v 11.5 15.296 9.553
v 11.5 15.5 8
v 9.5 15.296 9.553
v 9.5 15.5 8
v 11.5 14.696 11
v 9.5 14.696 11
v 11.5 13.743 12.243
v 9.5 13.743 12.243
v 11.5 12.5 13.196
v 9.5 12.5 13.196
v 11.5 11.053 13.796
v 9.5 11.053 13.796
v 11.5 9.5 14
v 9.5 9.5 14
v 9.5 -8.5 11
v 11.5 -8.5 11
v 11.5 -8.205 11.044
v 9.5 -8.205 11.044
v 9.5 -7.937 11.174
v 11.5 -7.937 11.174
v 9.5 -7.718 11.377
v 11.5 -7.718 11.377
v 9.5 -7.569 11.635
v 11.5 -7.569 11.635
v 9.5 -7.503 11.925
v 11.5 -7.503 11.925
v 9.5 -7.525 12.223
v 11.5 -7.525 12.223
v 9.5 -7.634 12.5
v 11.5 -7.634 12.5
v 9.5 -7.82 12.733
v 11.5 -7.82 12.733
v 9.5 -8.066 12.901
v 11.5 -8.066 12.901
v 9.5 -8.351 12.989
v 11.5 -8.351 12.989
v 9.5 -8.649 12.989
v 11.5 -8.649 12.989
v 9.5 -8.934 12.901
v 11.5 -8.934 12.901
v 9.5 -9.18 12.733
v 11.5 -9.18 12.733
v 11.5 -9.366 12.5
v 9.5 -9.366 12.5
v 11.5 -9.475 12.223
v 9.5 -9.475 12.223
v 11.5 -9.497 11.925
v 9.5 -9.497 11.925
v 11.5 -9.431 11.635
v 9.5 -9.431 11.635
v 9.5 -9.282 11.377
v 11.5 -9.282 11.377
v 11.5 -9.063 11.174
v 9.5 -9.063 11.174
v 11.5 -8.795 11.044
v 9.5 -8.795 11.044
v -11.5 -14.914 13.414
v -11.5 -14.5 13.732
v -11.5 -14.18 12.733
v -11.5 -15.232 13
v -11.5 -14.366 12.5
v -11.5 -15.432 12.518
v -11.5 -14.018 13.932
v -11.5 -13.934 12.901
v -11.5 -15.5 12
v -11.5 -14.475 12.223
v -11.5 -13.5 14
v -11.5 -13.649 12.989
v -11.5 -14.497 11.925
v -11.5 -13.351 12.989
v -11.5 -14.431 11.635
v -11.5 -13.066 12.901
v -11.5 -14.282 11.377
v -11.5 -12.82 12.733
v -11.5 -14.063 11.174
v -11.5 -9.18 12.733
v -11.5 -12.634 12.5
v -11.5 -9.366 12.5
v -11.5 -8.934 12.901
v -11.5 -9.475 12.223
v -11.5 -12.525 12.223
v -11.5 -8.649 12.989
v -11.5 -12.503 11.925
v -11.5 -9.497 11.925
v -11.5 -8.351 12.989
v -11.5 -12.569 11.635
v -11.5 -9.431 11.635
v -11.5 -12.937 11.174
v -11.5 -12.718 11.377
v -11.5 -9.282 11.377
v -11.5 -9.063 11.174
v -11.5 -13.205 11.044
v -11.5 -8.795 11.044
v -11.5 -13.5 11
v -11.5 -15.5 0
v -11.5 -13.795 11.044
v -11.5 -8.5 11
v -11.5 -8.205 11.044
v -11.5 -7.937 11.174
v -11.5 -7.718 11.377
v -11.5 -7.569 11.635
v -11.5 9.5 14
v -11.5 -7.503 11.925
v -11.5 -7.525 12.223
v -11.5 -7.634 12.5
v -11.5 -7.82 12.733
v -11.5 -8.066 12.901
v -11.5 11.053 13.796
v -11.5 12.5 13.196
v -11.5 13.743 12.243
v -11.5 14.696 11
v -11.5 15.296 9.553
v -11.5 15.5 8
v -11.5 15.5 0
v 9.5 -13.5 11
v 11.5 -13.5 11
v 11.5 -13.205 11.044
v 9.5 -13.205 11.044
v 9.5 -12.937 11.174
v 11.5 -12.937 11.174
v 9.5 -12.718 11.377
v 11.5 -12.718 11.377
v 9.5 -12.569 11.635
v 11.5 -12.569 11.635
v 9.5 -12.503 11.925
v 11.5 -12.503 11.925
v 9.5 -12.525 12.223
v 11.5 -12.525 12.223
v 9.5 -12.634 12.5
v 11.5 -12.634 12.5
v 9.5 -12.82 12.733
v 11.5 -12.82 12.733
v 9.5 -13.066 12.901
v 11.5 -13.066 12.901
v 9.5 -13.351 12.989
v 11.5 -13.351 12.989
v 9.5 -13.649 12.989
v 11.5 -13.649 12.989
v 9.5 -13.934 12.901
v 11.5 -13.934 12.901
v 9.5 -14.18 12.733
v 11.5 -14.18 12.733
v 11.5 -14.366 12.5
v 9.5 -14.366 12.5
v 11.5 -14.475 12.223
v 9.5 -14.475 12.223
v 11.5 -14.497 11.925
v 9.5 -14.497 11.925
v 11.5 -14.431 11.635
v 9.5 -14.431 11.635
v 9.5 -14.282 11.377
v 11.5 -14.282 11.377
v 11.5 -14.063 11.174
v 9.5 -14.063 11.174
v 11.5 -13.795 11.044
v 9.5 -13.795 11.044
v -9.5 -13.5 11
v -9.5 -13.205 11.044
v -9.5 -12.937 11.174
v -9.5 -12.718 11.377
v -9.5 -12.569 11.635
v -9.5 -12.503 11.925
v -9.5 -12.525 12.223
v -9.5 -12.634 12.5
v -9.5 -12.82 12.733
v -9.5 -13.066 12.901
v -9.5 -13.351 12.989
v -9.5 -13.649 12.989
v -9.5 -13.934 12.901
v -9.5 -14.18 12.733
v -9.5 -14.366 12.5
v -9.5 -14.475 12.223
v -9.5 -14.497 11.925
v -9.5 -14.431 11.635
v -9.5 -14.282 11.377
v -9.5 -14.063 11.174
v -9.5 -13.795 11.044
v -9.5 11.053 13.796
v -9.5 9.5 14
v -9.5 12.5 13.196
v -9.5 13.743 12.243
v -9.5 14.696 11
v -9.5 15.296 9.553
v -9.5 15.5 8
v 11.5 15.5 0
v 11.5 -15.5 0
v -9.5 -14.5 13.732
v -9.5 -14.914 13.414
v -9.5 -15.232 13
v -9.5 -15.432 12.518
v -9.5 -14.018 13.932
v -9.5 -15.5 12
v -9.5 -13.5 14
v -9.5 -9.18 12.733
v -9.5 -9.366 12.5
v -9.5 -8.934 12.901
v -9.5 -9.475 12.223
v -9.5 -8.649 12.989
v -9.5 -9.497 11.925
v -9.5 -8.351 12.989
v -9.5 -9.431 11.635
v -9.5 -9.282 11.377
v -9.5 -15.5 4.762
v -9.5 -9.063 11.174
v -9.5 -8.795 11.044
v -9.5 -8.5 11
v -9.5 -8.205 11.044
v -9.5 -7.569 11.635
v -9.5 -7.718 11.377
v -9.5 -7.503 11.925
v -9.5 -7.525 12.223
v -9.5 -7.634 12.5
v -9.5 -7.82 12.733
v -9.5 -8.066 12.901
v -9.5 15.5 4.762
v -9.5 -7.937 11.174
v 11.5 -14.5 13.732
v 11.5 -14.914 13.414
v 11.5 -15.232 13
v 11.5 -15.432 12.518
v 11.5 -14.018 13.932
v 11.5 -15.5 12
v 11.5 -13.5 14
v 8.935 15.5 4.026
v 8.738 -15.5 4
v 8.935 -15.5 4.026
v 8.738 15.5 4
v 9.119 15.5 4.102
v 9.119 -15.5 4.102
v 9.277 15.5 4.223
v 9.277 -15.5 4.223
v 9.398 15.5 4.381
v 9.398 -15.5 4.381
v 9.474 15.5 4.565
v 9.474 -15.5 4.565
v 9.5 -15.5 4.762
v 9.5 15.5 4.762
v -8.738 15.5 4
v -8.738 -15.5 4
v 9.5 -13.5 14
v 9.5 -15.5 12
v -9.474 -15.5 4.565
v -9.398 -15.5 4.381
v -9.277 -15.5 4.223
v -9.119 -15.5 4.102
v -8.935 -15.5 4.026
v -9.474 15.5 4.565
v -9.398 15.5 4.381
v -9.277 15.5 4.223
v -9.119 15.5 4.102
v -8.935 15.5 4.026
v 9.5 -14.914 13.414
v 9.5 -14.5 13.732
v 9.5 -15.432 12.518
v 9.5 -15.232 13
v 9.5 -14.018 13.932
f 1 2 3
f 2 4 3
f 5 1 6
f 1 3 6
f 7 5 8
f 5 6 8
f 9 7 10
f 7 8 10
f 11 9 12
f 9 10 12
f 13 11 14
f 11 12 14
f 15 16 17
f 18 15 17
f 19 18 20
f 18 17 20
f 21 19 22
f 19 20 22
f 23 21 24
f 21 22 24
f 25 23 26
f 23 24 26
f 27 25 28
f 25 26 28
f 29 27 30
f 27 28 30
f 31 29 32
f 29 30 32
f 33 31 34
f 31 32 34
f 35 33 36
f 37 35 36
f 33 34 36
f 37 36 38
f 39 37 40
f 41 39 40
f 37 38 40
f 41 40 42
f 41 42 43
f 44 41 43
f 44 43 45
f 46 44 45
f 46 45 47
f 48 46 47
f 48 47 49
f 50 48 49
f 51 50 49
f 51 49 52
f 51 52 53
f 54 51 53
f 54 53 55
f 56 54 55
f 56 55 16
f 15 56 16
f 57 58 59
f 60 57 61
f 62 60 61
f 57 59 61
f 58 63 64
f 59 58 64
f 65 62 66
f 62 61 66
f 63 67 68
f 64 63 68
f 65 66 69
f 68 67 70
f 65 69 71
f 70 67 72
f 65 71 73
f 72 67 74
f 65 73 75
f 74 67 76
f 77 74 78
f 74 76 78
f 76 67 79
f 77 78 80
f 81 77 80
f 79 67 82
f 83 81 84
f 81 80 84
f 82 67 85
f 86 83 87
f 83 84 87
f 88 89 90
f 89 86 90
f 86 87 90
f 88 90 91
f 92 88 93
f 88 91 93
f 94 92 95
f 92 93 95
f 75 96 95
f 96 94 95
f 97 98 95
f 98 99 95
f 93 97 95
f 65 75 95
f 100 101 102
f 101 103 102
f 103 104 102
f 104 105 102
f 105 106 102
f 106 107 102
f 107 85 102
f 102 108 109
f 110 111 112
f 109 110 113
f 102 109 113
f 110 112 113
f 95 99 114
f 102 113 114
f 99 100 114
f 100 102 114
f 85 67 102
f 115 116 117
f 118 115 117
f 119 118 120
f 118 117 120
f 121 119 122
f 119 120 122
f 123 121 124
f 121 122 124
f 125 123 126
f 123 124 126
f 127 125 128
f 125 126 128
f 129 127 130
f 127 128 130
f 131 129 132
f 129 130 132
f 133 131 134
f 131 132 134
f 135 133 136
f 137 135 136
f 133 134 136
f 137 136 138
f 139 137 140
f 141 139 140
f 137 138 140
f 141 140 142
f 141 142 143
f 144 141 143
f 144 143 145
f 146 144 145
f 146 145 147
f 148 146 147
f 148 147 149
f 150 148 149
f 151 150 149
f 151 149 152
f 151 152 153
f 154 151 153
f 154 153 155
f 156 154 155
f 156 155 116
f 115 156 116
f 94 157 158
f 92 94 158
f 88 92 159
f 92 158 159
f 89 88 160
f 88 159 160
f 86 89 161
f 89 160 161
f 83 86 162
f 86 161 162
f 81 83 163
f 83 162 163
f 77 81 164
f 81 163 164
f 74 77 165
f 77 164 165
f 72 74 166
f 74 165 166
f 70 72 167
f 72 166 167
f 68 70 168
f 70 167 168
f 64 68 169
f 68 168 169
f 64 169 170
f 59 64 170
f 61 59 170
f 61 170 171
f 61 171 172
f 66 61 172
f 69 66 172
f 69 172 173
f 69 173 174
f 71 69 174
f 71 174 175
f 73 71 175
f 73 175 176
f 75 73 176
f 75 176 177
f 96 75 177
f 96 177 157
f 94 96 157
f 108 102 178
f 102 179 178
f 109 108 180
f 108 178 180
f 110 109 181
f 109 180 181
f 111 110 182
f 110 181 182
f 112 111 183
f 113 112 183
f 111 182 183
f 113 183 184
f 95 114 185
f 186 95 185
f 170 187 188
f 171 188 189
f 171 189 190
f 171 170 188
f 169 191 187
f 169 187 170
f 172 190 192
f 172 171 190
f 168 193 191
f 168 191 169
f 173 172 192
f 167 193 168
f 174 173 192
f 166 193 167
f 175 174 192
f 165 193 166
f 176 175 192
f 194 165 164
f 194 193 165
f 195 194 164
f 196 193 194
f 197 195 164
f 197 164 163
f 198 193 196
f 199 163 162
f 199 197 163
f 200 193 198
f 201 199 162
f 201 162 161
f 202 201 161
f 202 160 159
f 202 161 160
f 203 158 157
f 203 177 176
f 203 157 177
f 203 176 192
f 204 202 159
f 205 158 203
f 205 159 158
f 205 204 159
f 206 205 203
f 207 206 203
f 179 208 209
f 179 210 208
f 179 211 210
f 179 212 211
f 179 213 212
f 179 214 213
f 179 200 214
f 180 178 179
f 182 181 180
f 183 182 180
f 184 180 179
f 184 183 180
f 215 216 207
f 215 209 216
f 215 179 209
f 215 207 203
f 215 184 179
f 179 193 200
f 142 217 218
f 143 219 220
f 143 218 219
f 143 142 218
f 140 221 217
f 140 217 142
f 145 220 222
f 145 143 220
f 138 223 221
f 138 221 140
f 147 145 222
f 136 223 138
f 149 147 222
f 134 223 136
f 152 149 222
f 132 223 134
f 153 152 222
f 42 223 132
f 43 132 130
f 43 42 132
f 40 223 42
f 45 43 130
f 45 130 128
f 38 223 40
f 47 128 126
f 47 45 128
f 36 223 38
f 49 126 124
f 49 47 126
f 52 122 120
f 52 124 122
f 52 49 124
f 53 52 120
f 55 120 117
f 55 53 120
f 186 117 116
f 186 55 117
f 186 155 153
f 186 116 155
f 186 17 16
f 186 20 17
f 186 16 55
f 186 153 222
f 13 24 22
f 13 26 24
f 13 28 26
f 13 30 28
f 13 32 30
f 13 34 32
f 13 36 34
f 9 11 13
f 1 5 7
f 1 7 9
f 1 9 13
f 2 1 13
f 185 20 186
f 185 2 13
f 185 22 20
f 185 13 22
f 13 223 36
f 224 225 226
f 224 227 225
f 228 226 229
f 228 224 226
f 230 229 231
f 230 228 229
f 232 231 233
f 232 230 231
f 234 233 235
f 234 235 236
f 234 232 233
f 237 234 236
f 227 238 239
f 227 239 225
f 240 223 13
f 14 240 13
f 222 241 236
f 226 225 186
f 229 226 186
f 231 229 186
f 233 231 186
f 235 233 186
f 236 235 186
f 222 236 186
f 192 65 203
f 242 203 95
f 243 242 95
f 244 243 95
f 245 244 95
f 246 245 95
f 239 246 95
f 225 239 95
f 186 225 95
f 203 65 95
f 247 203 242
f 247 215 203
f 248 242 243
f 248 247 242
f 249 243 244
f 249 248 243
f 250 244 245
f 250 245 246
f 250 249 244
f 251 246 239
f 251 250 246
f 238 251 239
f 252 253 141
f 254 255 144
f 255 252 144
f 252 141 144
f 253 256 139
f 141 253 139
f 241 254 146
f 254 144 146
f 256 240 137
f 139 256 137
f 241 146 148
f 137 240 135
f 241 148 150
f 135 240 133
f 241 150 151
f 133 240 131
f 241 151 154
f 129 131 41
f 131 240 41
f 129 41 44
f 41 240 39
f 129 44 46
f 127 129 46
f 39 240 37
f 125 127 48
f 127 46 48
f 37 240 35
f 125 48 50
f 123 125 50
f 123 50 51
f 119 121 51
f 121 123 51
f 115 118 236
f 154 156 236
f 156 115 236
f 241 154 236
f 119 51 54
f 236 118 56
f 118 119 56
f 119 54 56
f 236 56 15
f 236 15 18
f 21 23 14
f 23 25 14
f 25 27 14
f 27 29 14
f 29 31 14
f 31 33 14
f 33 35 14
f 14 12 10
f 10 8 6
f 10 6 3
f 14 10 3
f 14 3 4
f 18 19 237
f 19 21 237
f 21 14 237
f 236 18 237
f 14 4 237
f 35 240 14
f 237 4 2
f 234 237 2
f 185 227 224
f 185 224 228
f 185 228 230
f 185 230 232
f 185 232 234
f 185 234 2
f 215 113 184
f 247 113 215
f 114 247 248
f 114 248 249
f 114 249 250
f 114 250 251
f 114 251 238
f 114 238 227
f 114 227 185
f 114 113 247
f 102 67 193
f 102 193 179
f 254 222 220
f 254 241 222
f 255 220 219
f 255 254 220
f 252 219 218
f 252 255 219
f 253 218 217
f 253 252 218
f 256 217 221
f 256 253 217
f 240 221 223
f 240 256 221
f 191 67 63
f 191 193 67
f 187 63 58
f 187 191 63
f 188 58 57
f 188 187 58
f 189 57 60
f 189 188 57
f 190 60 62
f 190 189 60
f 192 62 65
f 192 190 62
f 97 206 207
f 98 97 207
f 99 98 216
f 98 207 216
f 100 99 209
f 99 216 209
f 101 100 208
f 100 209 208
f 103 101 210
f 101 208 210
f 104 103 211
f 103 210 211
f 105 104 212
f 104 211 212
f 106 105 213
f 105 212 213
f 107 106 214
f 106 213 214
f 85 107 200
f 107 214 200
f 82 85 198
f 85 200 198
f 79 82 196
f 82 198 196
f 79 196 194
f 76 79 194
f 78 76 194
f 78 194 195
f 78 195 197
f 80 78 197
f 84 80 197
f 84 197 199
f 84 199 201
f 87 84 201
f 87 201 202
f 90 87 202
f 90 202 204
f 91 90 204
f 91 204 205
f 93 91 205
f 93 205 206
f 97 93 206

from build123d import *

# Parameters (mm, degrees)
SKETCH1_W           = 23
SKETCH1_H           = 31
BOSS_EXTRUDE1_DEPTH = 4
SKETCH2_W           = 10
SKETCH2_H           = 31
BOSS_EXTRUDE2_DEPTH = 2
SKETCH3_R           = 1
CUT_EXTRUDE1_DEPTH  = 24
FILLET1_R           = 2
FILLET2_R           = 6
FILLET3_R           = 0.762


with BuildPart() as part:
    # Sketch1 → Boss-Extrude1 (new body)
    with BuildSketch(Plane.XY):
        Rectangle(SKETCH1_W, SKETCH1_H)
    extrude(amount=BOSS_EXTRUDE1_DEPTH)

    # Sketch2 → Boss-Extrude2 (add)
    with BuildSketch(Plane(origin=(11.5, 0, 0), x_dir=(0, 0, -1), z_dir=(1, 0, 0))):
        with Locations((-9, 0)):
            Rectangle(SKETCH2_W, SKETCH2_H)
    boss_extrude2 = extrude(amount=-BOSS_EXTRUDE2_DEPTH)

    # Mirror1: Boss-Extrude2 across plane
    add(boss_extrude2.mirror(Plane(origin=(0, 0, 0), x_dir=(0, 0, 1), z_dir=(1, 0, 0))))

    # Sketch3 → Cut-Extrude1 (cut, through all)
    with BuildSketch(Plane(origin=(11.5, 0, 0), x_dir=(0, 0, -1), z_dir=(1, 0, 0))):
        with Locations((-12, -8.5)):
            Circle(SKETCH3_R)
        with Locations((-12, -13.5)):
            Circle(SKETCH3_R)
    extrude(amount=-CUT_EXTRUDE1_DEPTH, mode=Mode.SUBTRACT)

    # Fillet1
    fillet1_edges = [part.edges().sort_by_distance(p)[0] for p in [
        (10.5, -15.5, 14),
        (-10.5, -15.5, 14),
    ]]
    fillet(fillet1_edges, radius=FILLET1_R)

    # Fillet2
    fillet2_edges = [part.edges().sort_by_distance(p)[0] for p in [
        (10.5, 15.5, 14),
        (-10.5, 15.5, 14),
    ]]
    fillet(fillet2_edges, radius=FILLET2_R)

    # Fillet3
    fillet3_edges = [part.edges().sort_by_distance(p)[0] for p in [
        (9.5, 0, 4),
        (-9.5, 0, 4),
    ]]
    fillet(fillet3_edges, radius=FILLET3_R)


solid = part.part
